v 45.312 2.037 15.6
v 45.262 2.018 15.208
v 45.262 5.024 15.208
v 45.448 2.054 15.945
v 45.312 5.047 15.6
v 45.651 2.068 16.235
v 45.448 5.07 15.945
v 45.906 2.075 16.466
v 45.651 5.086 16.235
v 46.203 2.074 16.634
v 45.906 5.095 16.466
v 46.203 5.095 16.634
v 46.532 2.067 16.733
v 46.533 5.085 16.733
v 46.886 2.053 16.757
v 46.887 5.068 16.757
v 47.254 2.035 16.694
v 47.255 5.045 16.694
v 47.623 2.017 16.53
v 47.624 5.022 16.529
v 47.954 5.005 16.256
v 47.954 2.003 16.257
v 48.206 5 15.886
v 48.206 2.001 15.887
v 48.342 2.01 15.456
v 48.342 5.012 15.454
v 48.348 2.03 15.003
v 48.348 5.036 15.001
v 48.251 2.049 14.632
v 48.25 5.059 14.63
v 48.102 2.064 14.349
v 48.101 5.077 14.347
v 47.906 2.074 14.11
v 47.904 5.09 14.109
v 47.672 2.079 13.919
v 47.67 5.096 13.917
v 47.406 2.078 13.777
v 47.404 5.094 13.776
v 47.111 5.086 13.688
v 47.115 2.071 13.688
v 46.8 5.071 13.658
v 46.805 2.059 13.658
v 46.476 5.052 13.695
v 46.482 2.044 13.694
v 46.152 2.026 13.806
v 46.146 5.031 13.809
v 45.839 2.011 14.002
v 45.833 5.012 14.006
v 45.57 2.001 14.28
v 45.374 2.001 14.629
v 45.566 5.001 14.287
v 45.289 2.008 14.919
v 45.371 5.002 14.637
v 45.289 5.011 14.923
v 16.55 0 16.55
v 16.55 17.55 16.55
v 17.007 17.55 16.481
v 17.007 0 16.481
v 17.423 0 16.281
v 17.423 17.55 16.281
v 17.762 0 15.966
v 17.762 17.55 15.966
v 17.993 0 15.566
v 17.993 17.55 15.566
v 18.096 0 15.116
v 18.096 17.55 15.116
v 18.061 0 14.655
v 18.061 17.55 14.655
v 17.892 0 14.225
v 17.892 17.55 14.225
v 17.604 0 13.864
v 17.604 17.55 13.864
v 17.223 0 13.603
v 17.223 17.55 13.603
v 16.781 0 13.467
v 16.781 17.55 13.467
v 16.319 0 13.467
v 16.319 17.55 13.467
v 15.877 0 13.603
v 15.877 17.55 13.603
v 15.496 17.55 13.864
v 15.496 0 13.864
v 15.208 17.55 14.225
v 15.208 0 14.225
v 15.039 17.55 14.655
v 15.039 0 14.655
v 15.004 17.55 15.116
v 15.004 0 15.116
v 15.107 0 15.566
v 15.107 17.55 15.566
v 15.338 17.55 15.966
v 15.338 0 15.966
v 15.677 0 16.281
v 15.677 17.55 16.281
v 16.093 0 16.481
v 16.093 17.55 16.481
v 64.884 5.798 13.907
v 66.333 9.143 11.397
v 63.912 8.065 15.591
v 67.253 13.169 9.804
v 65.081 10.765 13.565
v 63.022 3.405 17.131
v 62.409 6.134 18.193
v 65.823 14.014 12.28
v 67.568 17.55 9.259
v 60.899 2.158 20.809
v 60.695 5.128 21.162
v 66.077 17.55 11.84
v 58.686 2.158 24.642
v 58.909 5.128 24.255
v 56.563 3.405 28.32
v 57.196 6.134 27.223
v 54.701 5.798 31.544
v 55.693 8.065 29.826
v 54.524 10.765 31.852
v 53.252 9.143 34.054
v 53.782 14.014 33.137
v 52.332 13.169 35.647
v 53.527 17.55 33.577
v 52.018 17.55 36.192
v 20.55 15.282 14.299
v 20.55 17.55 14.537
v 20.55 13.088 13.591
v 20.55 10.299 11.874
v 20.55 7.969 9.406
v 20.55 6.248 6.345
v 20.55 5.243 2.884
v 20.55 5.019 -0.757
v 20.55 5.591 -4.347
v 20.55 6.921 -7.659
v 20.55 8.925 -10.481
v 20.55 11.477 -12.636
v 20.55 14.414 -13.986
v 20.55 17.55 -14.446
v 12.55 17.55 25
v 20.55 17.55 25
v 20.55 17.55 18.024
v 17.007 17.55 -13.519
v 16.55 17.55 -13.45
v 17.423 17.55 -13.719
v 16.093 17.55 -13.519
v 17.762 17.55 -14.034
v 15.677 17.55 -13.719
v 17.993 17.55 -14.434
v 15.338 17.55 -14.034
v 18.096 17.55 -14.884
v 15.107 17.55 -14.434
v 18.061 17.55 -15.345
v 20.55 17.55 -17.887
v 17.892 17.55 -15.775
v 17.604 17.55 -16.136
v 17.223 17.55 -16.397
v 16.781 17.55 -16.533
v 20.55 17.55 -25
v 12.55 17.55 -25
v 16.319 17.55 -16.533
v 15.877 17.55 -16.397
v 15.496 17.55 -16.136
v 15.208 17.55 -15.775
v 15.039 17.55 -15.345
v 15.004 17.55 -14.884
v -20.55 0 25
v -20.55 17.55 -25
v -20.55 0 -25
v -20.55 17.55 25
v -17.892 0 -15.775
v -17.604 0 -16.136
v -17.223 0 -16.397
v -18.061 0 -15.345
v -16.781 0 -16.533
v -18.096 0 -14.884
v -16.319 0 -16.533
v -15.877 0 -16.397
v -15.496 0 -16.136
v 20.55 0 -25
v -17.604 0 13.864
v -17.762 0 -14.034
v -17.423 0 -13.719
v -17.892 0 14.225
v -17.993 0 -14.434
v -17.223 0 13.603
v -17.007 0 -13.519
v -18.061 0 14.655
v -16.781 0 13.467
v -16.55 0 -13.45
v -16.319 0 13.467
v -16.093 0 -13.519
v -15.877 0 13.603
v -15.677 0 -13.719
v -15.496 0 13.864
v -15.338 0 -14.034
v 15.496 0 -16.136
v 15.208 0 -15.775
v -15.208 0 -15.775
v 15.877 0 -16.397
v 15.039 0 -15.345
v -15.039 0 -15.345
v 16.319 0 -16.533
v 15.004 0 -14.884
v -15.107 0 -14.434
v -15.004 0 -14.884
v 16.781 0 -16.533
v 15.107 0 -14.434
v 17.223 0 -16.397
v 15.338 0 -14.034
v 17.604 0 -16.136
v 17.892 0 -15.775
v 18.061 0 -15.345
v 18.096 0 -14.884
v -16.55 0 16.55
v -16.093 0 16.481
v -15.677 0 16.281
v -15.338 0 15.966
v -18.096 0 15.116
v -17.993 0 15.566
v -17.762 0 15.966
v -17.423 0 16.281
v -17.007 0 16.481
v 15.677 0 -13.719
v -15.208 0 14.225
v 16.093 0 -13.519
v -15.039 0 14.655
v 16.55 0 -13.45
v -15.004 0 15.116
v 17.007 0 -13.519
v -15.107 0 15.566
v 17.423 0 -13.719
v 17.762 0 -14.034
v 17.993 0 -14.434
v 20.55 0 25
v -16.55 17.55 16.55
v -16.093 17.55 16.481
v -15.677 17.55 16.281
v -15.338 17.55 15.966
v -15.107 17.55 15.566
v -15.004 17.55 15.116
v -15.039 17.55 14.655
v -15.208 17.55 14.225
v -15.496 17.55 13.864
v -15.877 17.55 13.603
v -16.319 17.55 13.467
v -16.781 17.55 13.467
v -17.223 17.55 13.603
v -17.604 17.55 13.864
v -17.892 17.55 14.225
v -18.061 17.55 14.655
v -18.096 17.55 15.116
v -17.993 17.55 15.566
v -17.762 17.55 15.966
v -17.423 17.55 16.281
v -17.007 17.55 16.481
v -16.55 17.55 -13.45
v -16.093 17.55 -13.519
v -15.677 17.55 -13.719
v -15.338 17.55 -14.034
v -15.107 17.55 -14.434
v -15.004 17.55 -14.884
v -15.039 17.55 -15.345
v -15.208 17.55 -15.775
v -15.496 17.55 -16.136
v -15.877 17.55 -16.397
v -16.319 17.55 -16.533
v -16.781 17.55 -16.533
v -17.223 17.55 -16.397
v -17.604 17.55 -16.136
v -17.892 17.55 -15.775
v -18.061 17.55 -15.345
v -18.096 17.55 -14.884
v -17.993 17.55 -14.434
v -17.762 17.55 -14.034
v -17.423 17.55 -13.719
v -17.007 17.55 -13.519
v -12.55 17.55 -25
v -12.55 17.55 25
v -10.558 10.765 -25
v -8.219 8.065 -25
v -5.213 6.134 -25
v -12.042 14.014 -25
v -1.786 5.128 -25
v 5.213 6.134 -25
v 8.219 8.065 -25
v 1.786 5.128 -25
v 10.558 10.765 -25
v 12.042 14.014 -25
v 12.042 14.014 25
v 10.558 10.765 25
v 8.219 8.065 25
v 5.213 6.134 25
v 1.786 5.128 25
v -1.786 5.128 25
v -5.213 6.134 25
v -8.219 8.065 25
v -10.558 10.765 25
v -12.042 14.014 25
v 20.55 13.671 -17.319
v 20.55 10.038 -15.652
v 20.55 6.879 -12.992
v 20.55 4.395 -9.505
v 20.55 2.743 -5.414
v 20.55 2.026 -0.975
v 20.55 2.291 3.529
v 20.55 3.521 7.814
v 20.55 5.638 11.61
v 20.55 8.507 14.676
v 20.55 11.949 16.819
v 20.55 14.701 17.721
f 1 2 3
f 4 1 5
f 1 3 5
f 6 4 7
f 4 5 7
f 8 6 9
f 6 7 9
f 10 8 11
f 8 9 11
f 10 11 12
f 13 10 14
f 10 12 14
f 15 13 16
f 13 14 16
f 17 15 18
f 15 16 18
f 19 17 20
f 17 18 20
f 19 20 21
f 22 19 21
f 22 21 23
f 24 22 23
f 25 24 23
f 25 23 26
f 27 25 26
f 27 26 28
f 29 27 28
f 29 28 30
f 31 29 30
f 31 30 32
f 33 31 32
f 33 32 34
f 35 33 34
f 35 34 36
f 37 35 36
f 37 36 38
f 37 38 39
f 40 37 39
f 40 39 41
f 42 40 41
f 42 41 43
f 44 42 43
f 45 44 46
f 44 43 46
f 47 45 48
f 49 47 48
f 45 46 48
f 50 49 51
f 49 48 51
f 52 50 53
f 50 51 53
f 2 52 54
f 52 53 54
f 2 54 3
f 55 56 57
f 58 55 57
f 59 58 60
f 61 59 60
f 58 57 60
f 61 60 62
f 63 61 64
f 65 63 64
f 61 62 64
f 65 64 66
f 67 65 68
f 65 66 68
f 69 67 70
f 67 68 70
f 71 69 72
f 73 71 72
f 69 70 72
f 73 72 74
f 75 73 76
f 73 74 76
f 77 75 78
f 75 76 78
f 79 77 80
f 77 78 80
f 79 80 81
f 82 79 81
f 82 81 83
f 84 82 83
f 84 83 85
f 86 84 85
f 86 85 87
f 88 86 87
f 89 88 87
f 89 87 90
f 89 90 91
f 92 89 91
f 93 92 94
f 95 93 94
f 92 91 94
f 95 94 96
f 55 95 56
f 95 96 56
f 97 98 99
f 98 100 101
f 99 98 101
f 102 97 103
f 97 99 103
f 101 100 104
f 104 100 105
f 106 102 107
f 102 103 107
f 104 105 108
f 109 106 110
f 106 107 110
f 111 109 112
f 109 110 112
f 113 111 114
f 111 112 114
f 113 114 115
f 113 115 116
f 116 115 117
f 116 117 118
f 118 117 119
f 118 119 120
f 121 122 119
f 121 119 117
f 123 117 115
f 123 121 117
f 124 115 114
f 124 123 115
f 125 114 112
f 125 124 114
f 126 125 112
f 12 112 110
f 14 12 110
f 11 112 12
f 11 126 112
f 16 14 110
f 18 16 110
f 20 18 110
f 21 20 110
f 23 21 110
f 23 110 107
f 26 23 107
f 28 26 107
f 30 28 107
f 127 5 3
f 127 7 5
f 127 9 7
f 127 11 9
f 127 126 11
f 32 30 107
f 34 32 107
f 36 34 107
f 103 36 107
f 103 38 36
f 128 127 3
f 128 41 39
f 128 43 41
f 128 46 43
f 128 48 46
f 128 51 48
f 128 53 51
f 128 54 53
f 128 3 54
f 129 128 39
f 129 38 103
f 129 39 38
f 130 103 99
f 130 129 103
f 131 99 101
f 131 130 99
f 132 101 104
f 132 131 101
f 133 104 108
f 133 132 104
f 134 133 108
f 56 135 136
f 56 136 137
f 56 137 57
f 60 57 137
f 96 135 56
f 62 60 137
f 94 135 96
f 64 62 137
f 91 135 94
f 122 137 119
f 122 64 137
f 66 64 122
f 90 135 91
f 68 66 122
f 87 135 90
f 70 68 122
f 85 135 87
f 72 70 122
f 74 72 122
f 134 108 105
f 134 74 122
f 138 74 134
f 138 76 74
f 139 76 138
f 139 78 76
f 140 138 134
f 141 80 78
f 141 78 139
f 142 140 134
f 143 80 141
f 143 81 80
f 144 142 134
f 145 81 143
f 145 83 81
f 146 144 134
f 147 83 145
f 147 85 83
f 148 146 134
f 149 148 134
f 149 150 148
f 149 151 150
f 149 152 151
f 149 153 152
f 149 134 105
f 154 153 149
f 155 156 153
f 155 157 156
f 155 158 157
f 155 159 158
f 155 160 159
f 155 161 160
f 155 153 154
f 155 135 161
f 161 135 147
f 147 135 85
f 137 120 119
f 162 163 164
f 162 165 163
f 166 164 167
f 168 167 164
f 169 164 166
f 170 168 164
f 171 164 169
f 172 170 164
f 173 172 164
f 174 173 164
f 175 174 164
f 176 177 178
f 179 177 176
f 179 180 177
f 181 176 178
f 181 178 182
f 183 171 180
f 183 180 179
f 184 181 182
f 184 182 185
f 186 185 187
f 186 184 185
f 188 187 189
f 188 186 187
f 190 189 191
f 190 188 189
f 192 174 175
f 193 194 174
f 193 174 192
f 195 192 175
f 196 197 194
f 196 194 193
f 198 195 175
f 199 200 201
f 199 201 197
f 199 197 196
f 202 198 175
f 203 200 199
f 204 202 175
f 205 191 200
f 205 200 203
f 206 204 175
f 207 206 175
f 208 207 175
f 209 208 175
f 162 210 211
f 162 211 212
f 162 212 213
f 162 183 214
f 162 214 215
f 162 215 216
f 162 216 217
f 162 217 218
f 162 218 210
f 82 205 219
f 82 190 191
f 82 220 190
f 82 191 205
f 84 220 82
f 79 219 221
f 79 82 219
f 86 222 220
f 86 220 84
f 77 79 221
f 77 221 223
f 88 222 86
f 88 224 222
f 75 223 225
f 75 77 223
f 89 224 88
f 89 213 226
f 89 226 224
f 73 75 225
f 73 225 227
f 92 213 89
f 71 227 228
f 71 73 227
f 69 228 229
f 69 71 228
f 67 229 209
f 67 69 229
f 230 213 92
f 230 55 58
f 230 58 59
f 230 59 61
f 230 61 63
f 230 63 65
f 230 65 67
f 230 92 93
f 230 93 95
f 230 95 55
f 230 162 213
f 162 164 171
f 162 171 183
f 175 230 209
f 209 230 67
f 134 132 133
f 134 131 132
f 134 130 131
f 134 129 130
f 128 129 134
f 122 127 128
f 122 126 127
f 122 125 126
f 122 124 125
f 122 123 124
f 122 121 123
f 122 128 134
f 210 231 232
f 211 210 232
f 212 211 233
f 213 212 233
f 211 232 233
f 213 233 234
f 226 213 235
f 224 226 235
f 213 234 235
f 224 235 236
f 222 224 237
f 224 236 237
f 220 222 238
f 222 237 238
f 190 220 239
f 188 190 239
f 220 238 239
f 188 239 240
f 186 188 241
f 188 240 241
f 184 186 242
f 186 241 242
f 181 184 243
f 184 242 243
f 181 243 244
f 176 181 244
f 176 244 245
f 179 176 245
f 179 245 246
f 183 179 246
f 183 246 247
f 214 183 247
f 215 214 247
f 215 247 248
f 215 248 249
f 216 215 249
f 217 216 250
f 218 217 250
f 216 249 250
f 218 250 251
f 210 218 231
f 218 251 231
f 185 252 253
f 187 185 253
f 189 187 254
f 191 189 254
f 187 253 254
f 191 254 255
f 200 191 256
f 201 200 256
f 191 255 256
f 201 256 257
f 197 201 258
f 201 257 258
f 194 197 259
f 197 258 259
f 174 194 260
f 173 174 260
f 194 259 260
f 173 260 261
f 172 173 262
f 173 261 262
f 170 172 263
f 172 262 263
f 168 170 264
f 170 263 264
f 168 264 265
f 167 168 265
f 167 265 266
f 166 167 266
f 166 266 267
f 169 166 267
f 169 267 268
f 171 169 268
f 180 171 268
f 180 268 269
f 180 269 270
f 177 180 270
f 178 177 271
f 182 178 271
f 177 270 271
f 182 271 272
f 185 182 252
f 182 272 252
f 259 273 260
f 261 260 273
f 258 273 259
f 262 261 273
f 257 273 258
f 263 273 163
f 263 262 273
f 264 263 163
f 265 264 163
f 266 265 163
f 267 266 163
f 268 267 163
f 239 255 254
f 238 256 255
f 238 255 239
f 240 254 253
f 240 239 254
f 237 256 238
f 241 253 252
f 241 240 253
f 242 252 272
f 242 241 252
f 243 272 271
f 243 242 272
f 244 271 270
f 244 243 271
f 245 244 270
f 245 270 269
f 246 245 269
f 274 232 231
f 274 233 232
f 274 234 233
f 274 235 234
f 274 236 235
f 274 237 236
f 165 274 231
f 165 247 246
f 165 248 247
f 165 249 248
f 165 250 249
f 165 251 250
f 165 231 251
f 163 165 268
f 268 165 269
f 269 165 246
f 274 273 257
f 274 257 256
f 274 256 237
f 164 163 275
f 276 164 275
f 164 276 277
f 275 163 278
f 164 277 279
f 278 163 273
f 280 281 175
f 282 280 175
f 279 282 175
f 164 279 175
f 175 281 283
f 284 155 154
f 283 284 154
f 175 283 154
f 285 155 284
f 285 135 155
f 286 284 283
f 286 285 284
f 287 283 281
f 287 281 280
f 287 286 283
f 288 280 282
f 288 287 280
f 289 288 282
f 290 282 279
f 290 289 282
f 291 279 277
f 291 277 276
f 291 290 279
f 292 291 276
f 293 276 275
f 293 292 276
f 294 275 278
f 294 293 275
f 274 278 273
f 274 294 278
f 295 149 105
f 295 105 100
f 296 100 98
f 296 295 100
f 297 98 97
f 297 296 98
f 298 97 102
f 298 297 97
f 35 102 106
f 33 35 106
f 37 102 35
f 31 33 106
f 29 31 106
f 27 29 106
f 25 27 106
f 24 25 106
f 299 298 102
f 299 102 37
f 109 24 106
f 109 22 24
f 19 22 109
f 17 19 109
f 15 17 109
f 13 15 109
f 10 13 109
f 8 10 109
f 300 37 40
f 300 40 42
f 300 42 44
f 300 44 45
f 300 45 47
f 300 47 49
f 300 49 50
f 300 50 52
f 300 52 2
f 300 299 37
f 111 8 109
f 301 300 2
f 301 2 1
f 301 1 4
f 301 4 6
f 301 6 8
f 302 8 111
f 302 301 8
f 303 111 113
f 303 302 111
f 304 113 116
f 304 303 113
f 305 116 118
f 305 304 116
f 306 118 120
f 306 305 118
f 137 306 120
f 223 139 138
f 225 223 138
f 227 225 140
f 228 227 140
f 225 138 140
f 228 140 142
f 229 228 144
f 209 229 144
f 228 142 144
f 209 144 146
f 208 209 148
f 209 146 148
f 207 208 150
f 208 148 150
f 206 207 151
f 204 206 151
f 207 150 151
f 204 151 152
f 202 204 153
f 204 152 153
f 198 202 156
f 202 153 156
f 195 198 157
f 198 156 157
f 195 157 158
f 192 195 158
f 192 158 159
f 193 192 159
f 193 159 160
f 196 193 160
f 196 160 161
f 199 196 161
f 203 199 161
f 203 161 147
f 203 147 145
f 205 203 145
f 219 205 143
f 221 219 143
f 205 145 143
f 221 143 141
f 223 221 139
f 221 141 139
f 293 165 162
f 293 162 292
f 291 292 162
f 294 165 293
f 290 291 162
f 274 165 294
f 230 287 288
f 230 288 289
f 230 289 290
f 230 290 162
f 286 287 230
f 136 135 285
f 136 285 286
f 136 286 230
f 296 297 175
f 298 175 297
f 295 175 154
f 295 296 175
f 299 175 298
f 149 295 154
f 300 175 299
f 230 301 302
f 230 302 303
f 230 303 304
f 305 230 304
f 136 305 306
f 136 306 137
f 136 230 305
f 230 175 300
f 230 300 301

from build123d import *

# Parameters (mm, degrees)
BOSS_EXTRUDE1_DEPTH             = 25
SKETCH2_R                       = 1.55
CUT_EXTRUDE1_DEPTH              = 17.55
BOSS_EXTRUDE2_REACH             = 68.8
BOSS_EXTRUDE2_DIRECTION_2_DEPTH = 30
CUT_EXTRUDE2_REACH              = 80.634
CUT_EXTRUDE2_END_RADIUS         = 15.55
SKETCH7_R                       = 1.55


with BuildPart() as part:
    # Sketch1 → Boss-Extrude1 (new, symmetric)
    with BuildSketch(Plane.XY):
        with BuildLine():
            Line((-20.55, 17.55), (-20.55, 0))
            Line((-20.55, 0), (20.55, 0))
            Line((20.55, 0), (20.55, 17.55))
            Line((20.55, 17.55), (12.55, 17.55))
            ThreePointArc((12.55, 17.55), (0, 5), (-12.55, 17.55))
            Line((-12.55, 17.55), (-20.55, 17.55))
        make_face()
    extrude(amount=BOSS_EXTRUDE1_DEPTH, both=True)

    # Sketch2 → Cut-Extrude1 (cut)
    with BuildSketch(Plane(origin=(0, 17.55, 0), x_dir=(1, 0, 0), z_dir=(0, 1, 0))):
        with Locations(Location((-16.55, 15, 0), (0, 0, 270))):
            Circle(SKETCH2_R)
        with Locations(Location((16.55, 15, 0), (0, 0, 270))):
            Circle(SKETCH2_R)
        with Locations(Location((16.55, -15, 0), (0, 0, 270))):
            Circle(SKETCH2_R)
        with Locations(Location((-16.55, -15, 0), (0, 0, 270))):
            Circle(SKETCH2_R)
    extrude(amount=-CUT_EXTRUDE1_DEPTH, mode=Mode.SUBTRACT)

    # Boss-Extrude2: up to this plane
    boss_extrude2_end = Plane(origin=(20.55, 0, 25), z_dir=(-1, 0, 0))
    # Sketch5 → Boss-Extrude2 (add, up to the surface)
    with BuildSketch(Plane(origin=(28.704083189, 0, 16.572310156), x_dir=(0.500000000000001, 0, -0.8660254037844382), z_dir=(0.866025403784438, 0, 0.5000000000000009)), mode=Mode.PRIVATE) as boss_extrude2_sk1:
        with BuildLine():
            Line((-5.334622532, 17.55), (-2.314823147, 17.55))
            ThreePointArc((-2.314823147, 17.55), (10.235176853, 5), (22.785176853, 17.55))
            Line((22.785176853, 17.55), (25.765377468, 17.55))
            ThreePointArc((25.765377468, 17.55), (10.215377468, 2), (-5.334622532, 17.55))
        make_face()
    boss_extrude2_tool1 = split(extrude(boss_extrude2_sk1.sketch, amount=-BOSS_EXTRUDE2_REACH, mode=Mode.PRIVATE), bisect_by=boss_extrude2_end, keep=Keep.BOTH, mode=Mode.PRIVATE)
    add(boss_extrude2_tool1.solids().sort_by_distance((33.811772, 2.347709, 7.725534))[0])

    # Sketch5 → Boss-Extrude2 direction 2 (add)
    with BuildSketch(Plane(origin=(28.704083189, 0, 16.572310156), x_dir=(0.500000000000001, 0, -0.8660254037844382), z_dir=(0.866025403784438, 0, 0.5000000000000009))):
        with BuildLine():
            Line((-5.334622532, 17.55), (-2.314823147, 17.55))
            ThreePointArc((-2.314823147, 17.55), (10.235176853, 5), (22.785176853, 17.55))
            Line((22.785176853, 17.55), (25.765377468, 17.55))
            ThreePointArc((25.765377468, 17.55), (10.215377468, 2), (-5.334622532, 17.55))
        make_face()
    extrude(amount=BOSS_EXTRUDE2_DIRECTION_2_DEPTH)

    # Cut-Extrude2: up to this cylinder (the profile starts inside it)
    cut_extrude2_end = Plane(origin=(46.802153231, 17.55, 15.225533904), z_dir=(-0.8660254037844382, 0, -0.500000000000001)) * Cylinder(CUT_EXTRUDE2_END_RADIUS, 193.368, mode=Mode.PRIVATE)
    # Sketch7 → Cut-Extrude2 (cut, up to the surface)
    with BuildSketch(Plane(origin=(0, 17.55, 0), x_dir=(1, 0, 0), z_dir=(0, 1, 0)), mode=Mode.PRIVATE) as cut_extrude2_sk1:
        with Locations(Location((46.812052672, -15.20838699, 0), (0, 0, 180))):
            Circle(SKETCH7_R)
    cut_extrude2_tool1 = extrude(cut_extrude2_sk1.sketch, amount=-CUT_EXTRUDE2_REACH, mode=Mode.PRIVATE) & cut_extrude2_end
    add(cut_extrude2_tool1.solids().sort_by_distance((46.812053, 17.55, 15.208387))[0], mode=Mode.SUBTRACT)


solid = part.part
